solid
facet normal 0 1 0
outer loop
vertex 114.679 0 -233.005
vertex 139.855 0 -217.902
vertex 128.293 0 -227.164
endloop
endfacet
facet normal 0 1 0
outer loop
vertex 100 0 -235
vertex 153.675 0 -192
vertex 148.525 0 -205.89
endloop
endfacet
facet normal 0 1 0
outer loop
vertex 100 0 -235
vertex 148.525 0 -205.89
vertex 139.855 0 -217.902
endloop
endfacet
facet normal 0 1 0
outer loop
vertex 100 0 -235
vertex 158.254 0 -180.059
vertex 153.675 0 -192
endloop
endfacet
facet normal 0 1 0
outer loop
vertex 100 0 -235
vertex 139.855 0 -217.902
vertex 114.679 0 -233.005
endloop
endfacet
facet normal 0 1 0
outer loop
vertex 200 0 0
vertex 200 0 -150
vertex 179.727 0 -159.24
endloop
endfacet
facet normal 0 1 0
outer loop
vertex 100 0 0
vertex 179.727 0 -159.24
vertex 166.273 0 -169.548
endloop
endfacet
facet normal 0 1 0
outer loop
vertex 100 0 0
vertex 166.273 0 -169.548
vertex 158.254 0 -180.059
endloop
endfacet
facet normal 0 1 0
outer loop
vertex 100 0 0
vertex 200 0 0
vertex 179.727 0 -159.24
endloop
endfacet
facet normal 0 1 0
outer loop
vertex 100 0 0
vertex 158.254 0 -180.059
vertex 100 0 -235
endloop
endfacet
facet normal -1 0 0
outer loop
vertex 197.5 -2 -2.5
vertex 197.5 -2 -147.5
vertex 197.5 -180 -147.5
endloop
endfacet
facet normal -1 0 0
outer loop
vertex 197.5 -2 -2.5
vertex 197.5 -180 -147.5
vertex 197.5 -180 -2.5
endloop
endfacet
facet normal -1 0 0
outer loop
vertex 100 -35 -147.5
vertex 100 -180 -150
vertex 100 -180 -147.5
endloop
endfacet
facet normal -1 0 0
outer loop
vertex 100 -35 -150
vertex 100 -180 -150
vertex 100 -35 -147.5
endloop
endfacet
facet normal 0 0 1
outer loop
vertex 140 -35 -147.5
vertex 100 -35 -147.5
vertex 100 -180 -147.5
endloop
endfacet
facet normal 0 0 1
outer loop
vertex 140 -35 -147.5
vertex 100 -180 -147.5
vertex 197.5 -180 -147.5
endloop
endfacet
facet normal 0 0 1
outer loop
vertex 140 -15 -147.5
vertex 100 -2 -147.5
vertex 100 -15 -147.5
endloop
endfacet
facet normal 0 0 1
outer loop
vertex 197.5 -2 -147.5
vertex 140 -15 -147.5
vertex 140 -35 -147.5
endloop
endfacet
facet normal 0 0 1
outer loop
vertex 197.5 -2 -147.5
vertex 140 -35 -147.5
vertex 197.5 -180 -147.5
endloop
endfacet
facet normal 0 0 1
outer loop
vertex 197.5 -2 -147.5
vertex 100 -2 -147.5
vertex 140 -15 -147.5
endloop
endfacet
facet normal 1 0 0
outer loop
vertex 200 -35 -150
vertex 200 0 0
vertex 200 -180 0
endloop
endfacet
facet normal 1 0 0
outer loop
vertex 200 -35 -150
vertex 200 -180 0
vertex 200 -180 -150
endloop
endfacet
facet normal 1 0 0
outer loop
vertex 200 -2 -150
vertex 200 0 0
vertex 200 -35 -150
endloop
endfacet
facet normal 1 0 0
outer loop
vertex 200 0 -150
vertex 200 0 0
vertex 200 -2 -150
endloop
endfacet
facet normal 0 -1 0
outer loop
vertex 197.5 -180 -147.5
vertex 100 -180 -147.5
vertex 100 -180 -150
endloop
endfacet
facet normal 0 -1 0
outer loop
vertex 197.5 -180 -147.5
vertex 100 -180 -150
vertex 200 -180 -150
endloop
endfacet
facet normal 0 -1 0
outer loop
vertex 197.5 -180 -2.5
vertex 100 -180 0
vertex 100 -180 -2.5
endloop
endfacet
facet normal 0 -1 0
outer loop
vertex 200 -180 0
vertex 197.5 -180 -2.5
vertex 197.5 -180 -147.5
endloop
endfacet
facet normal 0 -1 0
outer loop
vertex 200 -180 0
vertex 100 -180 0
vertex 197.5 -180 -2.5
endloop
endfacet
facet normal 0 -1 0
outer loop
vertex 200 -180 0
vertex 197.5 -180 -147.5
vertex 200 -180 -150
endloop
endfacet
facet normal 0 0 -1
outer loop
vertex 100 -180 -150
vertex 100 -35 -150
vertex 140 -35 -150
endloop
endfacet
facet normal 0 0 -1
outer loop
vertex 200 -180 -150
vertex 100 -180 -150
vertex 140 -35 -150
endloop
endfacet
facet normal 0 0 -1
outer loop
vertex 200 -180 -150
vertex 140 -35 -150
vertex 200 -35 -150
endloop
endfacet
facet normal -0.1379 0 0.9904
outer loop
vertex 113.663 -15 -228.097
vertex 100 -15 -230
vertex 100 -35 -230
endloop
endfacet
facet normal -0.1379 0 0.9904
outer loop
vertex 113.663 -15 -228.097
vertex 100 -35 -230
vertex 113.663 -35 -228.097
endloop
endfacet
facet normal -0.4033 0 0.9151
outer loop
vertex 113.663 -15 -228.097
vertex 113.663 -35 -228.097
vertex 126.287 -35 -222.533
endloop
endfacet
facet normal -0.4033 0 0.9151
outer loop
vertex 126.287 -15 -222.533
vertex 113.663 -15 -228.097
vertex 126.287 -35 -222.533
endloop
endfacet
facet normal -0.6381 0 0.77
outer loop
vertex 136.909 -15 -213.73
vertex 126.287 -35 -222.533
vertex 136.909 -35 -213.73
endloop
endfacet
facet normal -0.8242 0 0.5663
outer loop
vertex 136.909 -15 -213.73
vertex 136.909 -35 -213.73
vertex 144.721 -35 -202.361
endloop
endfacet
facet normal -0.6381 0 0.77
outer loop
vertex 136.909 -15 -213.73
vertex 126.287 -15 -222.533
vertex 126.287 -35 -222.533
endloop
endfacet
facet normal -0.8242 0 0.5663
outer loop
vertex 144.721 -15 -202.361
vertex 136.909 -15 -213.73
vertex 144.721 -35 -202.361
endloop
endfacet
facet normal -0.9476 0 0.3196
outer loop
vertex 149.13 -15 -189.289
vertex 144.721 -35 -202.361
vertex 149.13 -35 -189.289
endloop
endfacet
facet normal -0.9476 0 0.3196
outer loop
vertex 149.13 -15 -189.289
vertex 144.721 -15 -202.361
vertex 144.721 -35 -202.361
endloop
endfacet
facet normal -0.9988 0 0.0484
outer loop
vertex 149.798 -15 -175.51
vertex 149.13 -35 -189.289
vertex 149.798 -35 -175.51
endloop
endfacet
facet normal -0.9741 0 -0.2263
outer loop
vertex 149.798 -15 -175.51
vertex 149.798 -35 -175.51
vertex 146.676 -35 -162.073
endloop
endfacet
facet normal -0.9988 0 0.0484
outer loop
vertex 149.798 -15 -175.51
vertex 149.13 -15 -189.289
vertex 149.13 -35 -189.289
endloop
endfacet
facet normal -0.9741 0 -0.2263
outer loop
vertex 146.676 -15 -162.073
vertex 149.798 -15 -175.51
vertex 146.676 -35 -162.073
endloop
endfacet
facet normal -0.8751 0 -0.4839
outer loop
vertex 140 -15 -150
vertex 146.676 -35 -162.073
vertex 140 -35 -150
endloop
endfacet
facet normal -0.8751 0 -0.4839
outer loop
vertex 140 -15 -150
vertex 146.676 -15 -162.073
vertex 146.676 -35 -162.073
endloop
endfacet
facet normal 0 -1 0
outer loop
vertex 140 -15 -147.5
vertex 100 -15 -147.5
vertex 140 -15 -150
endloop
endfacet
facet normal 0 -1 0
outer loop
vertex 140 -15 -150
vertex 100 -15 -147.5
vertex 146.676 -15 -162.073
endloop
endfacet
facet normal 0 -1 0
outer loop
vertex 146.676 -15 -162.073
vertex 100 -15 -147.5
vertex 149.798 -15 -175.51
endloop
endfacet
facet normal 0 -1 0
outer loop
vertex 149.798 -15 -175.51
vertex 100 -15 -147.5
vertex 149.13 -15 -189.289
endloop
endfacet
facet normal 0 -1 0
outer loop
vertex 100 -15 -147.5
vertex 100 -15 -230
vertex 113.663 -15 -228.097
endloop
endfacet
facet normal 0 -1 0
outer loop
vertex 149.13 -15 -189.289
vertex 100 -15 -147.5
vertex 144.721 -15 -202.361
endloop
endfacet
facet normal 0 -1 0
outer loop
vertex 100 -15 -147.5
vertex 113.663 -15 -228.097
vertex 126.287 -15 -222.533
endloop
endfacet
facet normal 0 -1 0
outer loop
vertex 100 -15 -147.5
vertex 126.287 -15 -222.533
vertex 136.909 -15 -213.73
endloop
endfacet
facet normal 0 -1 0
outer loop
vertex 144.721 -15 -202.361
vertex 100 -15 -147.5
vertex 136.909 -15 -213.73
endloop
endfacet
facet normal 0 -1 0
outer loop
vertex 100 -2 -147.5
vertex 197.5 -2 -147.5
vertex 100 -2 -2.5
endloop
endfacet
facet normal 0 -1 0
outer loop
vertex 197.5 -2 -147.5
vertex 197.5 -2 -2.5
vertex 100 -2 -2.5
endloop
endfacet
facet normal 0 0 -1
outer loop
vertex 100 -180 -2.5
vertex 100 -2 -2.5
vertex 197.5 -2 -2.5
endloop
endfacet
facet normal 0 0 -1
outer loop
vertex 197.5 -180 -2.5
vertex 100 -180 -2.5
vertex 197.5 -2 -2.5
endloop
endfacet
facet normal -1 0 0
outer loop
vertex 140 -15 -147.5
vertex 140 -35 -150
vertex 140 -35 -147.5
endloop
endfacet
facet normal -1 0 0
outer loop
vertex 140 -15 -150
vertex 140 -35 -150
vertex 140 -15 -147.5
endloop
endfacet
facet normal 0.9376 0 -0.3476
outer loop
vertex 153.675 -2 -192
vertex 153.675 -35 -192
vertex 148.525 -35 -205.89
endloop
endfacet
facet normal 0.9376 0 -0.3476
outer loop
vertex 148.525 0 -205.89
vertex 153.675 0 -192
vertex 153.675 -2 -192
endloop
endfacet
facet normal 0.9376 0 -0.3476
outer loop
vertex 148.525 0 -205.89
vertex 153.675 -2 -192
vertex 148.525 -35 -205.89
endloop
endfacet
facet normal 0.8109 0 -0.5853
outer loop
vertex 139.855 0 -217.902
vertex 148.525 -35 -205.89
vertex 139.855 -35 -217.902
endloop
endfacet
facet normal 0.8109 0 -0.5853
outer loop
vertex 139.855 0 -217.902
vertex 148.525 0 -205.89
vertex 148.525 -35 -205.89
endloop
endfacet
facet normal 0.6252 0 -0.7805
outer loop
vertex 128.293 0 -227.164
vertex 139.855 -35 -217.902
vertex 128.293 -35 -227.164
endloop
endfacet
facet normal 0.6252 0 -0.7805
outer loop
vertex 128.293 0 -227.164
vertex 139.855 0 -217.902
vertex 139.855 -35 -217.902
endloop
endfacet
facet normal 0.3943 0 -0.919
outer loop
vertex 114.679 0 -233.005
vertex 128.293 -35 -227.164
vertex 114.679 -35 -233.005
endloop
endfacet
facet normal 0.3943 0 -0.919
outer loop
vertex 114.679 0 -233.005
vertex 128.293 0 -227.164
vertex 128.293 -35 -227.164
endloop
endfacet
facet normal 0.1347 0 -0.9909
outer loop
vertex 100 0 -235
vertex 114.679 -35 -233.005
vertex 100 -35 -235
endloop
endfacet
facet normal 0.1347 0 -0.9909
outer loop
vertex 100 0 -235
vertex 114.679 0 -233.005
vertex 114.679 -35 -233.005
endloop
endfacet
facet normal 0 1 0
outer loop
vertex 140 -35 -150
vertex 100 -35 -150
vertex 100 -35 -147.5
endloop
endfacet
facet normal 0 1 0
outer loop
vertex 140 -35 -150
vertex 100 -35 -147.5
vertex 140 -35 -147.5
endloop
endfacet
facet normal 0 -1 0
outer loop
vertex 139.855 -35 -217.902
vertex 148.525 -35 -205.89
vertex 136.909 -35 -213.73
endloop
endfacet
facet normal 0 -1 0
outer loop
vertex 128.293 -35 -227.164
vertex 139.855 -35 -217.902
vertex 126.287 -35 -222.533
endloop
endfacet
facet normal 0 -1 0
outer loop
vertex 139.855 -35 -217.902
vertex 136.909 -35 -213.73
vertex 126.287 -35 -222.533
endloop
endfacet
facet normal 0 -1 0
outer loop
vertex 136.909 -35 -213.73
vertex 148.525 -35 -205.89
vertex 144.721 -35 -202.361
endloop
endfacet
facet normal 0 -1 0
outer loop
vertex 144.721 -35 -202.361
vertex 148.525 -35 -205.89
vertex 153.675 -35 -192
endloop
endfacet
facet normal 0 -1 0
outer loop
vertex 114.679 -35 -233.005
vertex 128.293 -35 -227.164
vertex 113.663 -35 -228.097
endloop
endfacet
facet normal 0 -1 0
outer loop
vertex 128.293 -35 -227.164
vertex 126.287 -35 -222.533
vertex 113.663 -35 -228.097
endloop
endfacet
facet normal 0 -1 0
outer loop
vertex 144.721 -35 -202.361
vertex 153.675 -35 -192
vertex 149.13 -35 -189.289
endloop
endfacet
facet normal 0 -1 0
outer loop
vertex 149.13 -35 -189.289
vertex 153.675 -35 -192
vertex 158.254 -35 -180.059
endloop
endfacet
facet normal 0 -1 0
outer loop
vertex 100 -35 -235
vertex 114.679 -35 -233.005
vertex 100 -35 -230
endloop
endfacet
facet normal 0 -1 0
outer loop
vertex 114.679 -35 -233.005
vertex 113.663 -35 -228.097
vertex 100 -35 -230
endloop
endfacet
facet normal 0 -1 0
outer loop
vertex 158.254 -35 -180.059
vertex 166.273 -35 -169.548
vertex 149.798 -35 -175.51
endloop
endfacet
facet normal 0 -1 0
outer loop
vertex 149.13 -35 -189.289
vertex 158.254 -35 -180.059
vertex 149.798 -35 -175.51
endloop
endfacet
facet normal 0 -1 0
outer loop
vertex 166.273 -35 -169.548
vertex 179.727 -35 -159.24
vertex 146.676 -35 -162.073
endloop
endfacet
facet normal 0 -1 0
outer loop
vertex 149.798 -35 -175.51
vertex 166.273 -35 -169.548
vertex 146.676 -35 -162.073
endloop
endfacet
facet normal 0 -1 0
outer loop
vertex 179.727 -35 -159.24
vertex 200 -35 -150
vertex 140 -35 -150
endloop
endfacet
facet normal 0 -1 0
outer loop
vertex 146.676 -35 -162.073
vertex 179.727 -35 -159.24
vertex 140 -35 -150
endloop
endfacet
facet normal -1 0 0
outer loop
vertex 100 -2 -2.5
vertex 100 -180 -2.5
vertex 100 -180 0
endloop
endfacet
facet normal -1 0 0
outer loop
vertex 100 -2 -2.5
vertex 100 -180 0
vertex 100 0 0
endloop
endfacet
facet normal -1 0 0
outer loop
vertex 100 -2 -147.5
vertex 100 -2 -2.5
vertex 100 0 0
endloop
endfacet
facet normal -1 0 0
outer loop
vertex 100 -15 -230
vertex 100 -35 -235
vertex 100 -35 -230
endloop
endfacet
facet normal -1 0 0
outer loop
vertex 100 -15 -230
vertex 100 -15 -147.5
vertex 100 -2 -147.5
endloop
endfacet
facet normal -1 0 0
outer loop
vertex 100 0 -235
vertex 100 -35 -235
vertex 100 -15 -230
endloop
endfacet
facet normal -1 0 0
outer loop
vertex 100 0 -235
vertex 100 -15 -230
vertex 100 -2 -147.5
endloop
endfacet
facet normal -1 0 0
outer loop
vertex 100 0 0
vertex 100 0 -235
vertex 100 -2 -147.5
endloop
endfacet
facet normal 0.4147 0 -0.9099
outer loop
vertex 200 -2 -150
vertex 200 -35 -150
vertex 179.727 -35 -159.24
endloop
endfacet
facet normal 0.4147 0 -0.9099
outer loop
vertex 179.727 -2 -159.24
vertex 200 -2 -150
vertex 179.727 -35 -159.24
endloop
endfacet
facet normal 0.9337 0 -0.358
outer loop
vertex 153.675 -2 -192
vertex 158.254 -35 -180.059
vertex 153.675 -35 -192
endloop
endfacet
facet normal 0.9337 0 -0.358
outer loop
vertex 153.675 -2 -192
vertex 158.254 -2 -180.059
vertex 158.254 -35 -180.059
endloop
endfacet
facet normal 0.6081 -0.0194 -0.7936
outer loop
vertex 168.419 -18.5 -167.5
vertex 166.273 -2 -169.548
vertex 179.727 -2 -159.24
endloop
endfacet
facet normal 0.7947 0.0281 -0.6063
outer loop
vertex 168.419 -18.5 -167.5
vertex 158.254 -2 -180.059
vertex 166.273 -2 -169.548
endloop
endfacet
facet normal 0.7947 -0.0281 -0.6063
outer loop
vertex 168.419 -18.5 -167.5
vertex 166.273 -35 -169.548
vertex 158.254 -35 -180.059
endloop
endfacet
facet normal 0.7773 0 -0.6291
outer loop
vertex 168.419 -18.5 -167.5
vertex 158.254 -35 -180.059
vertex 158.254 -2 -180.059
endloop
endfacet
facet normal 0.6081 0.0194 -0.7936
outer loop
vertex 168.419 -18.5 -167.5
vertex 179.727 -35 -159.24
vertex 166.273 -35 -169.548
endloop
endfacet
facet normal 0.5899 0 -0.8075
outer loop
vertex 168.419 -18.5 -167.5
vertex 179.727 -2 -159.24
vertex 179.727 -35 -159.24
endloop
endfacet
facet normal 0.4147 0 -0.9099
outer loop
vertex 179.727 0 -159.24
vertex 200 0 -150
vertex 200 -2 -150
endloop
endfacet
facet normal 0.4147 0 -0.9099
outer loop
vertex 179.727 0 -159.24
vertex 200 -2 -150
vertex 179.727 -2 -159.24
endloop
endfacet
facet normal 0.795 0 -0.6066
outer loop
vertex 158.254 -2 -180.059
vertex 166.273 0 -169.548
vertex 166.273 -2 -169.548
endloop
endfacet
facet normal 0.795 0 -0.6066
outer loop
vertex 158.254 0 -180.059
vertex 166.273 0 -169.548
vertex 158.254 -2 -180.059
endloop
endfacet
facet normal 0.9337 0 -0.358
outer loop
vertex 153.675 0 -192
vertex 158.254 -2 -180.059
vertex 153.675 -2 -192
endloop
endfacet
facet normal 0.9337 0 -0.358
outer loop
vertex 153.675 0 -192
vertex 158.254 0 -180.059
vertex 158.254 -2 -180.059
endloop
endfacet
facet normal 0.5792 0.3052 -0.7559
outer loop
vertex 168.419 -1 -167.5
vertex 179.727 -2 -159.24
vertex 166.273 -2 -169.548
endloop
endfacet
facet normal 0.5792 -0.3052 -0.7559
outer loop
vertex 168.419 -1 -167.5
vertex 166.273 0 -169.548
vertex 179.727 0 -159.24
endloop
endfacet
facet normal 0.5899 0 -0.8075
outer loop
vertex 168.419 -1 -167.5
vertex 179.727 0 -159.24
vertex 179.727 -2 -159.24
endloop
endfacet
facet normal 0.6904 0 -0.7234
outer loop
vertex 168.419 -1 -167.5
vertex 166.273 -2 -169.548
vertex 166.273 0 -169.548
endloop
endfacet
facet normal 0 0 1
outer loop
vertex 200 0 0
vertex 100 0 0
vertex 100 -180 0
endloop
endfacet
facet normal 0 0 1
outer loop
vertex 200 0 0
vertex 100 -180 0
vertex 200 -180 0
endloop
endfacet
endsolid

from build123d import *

# Parameters (mm, degrees)
BOX_W                                = 100
BOX_H                                = 200
BOX_DEPTH                            = 250
SKETCH004_W                          = 80
SKETCH004_H                          = 20
EXTRUDE005_DEPTH                     = 20
SKETCH_AS_DRAWN_W                    = 200
SKETCH_AS_DRAWN_H                    = 150
SKETCH_AS_DRAWN_W_2                  = 195
SKETCH_AS_DRAWN_H_2                  = 145
EXTRUDE_DEPTH                        = 180
EXTRUDE_ONTO_SKETCH_ROLL_ANGLE       = 90
EXTRUDE004_DEPTH                     = 20
EXTRUDE004_ONTO_SKETCH002_ROLL_ANGLE = 90
EXTRUDE002_DEPTH                     = 35
EXTRUDE002_ONTO_SKETCH003_ROLL_ANGLE = 90
EXTRUDE001_DEPTH                     = 2
EXTRUDE001_ONTO_SKETCH001_ROLL_ANGLE = 90


with BuildPart() as cube:
    # Box → Box (new body)
    with BuildSketch(Plane(origin=(0, -200, -240), x_dir=(1, 0, 0), z_dir=(0, 0, 1))):
        with Locations((50, 100)):
            Rectangle(BOX_W, BOX_H)
    extrude(amount=BOX_DEPTH)


with BuildPart() as extrude005:
    # Sketch004 → Extrude005 (new body)
    with BuildSketch(Plane.XY.offset(-147.5)):
        with Locations((100, -25)):
            Rectangle(SKETCH004_W, SKETCH004_H)
    extrude(amount=EXTRUDE005_DEPTH)


with BuildPart() as extrude005_1:
    # Extrude005 placement: moved
    add(extrude005.part.moved(Location((0, 0, -6))))


with BuildPart() as cut001:
    # Sketch as drawn → Extrude (new)
    with BuildSketch(Plane.XY):
        with Locations((100, -75)):
            Rectangle(SKETCH_AS_DRAWN_W, SKETCH_AS_DRAWN_H)
        with Locations((100, -75)):
            Rectangle(SKETCH_AS_DRAWN_W_2, SKETCH_AS_DRAWN_H_2, mode=Mode.SUBTRACT)
    extrude(amount=EXTRUDE_DEPTH)


with BuildPart() as cut001_1:
    # Extrude onto Sketch roll: moved
    add(cut001.part.rotate(Axis((0, 0, 0), (1, 0, 0)), EXTRUDE_ONTO_SKETCH_ROLL_ANGLE))


with BuildPart() as cut001_2:
    # Extrude onto Sketch placement: moved
    add(cut001_1.part)

    # Cut001: cut Extrude005
    add(extrude005_1.part, mode=Mode.SUBTRACT)


with BuildPart() as extrude004:
    # Sketch002 as drawn → Extrude004 (new)
    with BuildSketch(Plane.XY):
        with BuildLine():
            ThreePointArc((60, -150), (100, -230), (140, -150))
            Line((60, -150), (140, -150))
        make_face()
    extrude(amount=EXTRUDE004_DEPTH)


with BuildPart() as extrude004_1:
    # Extrude004 onto Sketch002 roll: moved
    add(extrude004.part.rotate(Axis((0, 0, 0), (1, 0, 0)), EXTRUDE004_ONTO_SKETCH002_ROLL_ANGLE))


with BuildPart() as extrude004_2:
    # Extrude004 onto Sketch002 placement: moved
    add(extrude004_1.part)


with BuildPart() as extrude004_3:
    # Extrude004 placement: moved
    add(extrude004_2.part.moved(Location((0, -15, 0))))


with BuildPart() as cut:
    # Sketch003 as drawn → Extrude002 (new)
    with BuildSketch(Plane.XY):
        with BuildLine():
            add(Edge.make_bspline(
                [(46.325052, -192), (40, -164), (0, -150)],
                knots=[0, 0, 0, 1, 1, 1], degree=2))
            Line((0, -150), (200, -150))
            add(Edge.make_bspline(
                [(200, -150), (160, -164), (153.674948, -192)],
                knots=[0, 0, 0, 1, 1, 1], degree=2))
            ThreePointArc((153.674948, -192), (100, -235), (46.325052, -192))
        make_face()
    extrude(amount=EXTRUDE002_DEPTH)


with BuildPart() as cut_1:
    # Extrude002 onto Sketch003 roll: moved
    add(cut.part.rotate(Axis((0, 0, 0), (1, 0, 0)), EXTRUDE002_ONTO_SKETCH003_ROLL_ANGLE))


with BuildPart() as cut_2:
    # Extrude002 onto Sketch003 placement: moved
    add(cut_1.part)

    # Cut: cut Extrude004
    add(extrude004_3.part, mode=Mode.SUBTRACT)


with BuildPart() as cut010:
    # Sketch001 as drawn → Extrude001 (new)
    with BuildSketch(Plane.XY):
        with BuildLine():
            add(Edge.make_bspline(
                [(46.325052, -192), (40, -164), (0, -150)],
                knots=[0, 0, 0, 1, 1, 1], degree=2))
            Line((0, -150), (0, 0))
            Line((0, 0), (200, 0))
            Line((200, 0), (200, -150))
            add(Edge.make_bspline(
                [(200, -150), (160, -164), (153.674948, -192)],
                knots=[0, 0, 0, 1, 1, 1], degree=2))
            ThreePointArc((153.674948, -192), (100, -235), (46.325052, -192))
        make_face()
    extrude(amount=EXTRUDE001_DEPTH)


with BuildPart() as cut010_1:
    # Extrude001 onto Sketch001 roll: moved
    add(cut010.part.rotate(Axis((0, 0, 0), (1, 0, 0)), EXTRUDE001_ONTO_SKETCH001_ROLL_ANGLE))


with BuildPart() as cut010_2:
    # Extrude001 onto Sketch001 placement: moved
    add(cut010_1.part)

    # Fusion: union Cut001, Cut
    add(cut001_2.part)
    add(cut_2.part)

    # Cut010: cut Cube
    add(cube.part, mode=Mode.SUBTRACT)


solid = cut010_2.part
